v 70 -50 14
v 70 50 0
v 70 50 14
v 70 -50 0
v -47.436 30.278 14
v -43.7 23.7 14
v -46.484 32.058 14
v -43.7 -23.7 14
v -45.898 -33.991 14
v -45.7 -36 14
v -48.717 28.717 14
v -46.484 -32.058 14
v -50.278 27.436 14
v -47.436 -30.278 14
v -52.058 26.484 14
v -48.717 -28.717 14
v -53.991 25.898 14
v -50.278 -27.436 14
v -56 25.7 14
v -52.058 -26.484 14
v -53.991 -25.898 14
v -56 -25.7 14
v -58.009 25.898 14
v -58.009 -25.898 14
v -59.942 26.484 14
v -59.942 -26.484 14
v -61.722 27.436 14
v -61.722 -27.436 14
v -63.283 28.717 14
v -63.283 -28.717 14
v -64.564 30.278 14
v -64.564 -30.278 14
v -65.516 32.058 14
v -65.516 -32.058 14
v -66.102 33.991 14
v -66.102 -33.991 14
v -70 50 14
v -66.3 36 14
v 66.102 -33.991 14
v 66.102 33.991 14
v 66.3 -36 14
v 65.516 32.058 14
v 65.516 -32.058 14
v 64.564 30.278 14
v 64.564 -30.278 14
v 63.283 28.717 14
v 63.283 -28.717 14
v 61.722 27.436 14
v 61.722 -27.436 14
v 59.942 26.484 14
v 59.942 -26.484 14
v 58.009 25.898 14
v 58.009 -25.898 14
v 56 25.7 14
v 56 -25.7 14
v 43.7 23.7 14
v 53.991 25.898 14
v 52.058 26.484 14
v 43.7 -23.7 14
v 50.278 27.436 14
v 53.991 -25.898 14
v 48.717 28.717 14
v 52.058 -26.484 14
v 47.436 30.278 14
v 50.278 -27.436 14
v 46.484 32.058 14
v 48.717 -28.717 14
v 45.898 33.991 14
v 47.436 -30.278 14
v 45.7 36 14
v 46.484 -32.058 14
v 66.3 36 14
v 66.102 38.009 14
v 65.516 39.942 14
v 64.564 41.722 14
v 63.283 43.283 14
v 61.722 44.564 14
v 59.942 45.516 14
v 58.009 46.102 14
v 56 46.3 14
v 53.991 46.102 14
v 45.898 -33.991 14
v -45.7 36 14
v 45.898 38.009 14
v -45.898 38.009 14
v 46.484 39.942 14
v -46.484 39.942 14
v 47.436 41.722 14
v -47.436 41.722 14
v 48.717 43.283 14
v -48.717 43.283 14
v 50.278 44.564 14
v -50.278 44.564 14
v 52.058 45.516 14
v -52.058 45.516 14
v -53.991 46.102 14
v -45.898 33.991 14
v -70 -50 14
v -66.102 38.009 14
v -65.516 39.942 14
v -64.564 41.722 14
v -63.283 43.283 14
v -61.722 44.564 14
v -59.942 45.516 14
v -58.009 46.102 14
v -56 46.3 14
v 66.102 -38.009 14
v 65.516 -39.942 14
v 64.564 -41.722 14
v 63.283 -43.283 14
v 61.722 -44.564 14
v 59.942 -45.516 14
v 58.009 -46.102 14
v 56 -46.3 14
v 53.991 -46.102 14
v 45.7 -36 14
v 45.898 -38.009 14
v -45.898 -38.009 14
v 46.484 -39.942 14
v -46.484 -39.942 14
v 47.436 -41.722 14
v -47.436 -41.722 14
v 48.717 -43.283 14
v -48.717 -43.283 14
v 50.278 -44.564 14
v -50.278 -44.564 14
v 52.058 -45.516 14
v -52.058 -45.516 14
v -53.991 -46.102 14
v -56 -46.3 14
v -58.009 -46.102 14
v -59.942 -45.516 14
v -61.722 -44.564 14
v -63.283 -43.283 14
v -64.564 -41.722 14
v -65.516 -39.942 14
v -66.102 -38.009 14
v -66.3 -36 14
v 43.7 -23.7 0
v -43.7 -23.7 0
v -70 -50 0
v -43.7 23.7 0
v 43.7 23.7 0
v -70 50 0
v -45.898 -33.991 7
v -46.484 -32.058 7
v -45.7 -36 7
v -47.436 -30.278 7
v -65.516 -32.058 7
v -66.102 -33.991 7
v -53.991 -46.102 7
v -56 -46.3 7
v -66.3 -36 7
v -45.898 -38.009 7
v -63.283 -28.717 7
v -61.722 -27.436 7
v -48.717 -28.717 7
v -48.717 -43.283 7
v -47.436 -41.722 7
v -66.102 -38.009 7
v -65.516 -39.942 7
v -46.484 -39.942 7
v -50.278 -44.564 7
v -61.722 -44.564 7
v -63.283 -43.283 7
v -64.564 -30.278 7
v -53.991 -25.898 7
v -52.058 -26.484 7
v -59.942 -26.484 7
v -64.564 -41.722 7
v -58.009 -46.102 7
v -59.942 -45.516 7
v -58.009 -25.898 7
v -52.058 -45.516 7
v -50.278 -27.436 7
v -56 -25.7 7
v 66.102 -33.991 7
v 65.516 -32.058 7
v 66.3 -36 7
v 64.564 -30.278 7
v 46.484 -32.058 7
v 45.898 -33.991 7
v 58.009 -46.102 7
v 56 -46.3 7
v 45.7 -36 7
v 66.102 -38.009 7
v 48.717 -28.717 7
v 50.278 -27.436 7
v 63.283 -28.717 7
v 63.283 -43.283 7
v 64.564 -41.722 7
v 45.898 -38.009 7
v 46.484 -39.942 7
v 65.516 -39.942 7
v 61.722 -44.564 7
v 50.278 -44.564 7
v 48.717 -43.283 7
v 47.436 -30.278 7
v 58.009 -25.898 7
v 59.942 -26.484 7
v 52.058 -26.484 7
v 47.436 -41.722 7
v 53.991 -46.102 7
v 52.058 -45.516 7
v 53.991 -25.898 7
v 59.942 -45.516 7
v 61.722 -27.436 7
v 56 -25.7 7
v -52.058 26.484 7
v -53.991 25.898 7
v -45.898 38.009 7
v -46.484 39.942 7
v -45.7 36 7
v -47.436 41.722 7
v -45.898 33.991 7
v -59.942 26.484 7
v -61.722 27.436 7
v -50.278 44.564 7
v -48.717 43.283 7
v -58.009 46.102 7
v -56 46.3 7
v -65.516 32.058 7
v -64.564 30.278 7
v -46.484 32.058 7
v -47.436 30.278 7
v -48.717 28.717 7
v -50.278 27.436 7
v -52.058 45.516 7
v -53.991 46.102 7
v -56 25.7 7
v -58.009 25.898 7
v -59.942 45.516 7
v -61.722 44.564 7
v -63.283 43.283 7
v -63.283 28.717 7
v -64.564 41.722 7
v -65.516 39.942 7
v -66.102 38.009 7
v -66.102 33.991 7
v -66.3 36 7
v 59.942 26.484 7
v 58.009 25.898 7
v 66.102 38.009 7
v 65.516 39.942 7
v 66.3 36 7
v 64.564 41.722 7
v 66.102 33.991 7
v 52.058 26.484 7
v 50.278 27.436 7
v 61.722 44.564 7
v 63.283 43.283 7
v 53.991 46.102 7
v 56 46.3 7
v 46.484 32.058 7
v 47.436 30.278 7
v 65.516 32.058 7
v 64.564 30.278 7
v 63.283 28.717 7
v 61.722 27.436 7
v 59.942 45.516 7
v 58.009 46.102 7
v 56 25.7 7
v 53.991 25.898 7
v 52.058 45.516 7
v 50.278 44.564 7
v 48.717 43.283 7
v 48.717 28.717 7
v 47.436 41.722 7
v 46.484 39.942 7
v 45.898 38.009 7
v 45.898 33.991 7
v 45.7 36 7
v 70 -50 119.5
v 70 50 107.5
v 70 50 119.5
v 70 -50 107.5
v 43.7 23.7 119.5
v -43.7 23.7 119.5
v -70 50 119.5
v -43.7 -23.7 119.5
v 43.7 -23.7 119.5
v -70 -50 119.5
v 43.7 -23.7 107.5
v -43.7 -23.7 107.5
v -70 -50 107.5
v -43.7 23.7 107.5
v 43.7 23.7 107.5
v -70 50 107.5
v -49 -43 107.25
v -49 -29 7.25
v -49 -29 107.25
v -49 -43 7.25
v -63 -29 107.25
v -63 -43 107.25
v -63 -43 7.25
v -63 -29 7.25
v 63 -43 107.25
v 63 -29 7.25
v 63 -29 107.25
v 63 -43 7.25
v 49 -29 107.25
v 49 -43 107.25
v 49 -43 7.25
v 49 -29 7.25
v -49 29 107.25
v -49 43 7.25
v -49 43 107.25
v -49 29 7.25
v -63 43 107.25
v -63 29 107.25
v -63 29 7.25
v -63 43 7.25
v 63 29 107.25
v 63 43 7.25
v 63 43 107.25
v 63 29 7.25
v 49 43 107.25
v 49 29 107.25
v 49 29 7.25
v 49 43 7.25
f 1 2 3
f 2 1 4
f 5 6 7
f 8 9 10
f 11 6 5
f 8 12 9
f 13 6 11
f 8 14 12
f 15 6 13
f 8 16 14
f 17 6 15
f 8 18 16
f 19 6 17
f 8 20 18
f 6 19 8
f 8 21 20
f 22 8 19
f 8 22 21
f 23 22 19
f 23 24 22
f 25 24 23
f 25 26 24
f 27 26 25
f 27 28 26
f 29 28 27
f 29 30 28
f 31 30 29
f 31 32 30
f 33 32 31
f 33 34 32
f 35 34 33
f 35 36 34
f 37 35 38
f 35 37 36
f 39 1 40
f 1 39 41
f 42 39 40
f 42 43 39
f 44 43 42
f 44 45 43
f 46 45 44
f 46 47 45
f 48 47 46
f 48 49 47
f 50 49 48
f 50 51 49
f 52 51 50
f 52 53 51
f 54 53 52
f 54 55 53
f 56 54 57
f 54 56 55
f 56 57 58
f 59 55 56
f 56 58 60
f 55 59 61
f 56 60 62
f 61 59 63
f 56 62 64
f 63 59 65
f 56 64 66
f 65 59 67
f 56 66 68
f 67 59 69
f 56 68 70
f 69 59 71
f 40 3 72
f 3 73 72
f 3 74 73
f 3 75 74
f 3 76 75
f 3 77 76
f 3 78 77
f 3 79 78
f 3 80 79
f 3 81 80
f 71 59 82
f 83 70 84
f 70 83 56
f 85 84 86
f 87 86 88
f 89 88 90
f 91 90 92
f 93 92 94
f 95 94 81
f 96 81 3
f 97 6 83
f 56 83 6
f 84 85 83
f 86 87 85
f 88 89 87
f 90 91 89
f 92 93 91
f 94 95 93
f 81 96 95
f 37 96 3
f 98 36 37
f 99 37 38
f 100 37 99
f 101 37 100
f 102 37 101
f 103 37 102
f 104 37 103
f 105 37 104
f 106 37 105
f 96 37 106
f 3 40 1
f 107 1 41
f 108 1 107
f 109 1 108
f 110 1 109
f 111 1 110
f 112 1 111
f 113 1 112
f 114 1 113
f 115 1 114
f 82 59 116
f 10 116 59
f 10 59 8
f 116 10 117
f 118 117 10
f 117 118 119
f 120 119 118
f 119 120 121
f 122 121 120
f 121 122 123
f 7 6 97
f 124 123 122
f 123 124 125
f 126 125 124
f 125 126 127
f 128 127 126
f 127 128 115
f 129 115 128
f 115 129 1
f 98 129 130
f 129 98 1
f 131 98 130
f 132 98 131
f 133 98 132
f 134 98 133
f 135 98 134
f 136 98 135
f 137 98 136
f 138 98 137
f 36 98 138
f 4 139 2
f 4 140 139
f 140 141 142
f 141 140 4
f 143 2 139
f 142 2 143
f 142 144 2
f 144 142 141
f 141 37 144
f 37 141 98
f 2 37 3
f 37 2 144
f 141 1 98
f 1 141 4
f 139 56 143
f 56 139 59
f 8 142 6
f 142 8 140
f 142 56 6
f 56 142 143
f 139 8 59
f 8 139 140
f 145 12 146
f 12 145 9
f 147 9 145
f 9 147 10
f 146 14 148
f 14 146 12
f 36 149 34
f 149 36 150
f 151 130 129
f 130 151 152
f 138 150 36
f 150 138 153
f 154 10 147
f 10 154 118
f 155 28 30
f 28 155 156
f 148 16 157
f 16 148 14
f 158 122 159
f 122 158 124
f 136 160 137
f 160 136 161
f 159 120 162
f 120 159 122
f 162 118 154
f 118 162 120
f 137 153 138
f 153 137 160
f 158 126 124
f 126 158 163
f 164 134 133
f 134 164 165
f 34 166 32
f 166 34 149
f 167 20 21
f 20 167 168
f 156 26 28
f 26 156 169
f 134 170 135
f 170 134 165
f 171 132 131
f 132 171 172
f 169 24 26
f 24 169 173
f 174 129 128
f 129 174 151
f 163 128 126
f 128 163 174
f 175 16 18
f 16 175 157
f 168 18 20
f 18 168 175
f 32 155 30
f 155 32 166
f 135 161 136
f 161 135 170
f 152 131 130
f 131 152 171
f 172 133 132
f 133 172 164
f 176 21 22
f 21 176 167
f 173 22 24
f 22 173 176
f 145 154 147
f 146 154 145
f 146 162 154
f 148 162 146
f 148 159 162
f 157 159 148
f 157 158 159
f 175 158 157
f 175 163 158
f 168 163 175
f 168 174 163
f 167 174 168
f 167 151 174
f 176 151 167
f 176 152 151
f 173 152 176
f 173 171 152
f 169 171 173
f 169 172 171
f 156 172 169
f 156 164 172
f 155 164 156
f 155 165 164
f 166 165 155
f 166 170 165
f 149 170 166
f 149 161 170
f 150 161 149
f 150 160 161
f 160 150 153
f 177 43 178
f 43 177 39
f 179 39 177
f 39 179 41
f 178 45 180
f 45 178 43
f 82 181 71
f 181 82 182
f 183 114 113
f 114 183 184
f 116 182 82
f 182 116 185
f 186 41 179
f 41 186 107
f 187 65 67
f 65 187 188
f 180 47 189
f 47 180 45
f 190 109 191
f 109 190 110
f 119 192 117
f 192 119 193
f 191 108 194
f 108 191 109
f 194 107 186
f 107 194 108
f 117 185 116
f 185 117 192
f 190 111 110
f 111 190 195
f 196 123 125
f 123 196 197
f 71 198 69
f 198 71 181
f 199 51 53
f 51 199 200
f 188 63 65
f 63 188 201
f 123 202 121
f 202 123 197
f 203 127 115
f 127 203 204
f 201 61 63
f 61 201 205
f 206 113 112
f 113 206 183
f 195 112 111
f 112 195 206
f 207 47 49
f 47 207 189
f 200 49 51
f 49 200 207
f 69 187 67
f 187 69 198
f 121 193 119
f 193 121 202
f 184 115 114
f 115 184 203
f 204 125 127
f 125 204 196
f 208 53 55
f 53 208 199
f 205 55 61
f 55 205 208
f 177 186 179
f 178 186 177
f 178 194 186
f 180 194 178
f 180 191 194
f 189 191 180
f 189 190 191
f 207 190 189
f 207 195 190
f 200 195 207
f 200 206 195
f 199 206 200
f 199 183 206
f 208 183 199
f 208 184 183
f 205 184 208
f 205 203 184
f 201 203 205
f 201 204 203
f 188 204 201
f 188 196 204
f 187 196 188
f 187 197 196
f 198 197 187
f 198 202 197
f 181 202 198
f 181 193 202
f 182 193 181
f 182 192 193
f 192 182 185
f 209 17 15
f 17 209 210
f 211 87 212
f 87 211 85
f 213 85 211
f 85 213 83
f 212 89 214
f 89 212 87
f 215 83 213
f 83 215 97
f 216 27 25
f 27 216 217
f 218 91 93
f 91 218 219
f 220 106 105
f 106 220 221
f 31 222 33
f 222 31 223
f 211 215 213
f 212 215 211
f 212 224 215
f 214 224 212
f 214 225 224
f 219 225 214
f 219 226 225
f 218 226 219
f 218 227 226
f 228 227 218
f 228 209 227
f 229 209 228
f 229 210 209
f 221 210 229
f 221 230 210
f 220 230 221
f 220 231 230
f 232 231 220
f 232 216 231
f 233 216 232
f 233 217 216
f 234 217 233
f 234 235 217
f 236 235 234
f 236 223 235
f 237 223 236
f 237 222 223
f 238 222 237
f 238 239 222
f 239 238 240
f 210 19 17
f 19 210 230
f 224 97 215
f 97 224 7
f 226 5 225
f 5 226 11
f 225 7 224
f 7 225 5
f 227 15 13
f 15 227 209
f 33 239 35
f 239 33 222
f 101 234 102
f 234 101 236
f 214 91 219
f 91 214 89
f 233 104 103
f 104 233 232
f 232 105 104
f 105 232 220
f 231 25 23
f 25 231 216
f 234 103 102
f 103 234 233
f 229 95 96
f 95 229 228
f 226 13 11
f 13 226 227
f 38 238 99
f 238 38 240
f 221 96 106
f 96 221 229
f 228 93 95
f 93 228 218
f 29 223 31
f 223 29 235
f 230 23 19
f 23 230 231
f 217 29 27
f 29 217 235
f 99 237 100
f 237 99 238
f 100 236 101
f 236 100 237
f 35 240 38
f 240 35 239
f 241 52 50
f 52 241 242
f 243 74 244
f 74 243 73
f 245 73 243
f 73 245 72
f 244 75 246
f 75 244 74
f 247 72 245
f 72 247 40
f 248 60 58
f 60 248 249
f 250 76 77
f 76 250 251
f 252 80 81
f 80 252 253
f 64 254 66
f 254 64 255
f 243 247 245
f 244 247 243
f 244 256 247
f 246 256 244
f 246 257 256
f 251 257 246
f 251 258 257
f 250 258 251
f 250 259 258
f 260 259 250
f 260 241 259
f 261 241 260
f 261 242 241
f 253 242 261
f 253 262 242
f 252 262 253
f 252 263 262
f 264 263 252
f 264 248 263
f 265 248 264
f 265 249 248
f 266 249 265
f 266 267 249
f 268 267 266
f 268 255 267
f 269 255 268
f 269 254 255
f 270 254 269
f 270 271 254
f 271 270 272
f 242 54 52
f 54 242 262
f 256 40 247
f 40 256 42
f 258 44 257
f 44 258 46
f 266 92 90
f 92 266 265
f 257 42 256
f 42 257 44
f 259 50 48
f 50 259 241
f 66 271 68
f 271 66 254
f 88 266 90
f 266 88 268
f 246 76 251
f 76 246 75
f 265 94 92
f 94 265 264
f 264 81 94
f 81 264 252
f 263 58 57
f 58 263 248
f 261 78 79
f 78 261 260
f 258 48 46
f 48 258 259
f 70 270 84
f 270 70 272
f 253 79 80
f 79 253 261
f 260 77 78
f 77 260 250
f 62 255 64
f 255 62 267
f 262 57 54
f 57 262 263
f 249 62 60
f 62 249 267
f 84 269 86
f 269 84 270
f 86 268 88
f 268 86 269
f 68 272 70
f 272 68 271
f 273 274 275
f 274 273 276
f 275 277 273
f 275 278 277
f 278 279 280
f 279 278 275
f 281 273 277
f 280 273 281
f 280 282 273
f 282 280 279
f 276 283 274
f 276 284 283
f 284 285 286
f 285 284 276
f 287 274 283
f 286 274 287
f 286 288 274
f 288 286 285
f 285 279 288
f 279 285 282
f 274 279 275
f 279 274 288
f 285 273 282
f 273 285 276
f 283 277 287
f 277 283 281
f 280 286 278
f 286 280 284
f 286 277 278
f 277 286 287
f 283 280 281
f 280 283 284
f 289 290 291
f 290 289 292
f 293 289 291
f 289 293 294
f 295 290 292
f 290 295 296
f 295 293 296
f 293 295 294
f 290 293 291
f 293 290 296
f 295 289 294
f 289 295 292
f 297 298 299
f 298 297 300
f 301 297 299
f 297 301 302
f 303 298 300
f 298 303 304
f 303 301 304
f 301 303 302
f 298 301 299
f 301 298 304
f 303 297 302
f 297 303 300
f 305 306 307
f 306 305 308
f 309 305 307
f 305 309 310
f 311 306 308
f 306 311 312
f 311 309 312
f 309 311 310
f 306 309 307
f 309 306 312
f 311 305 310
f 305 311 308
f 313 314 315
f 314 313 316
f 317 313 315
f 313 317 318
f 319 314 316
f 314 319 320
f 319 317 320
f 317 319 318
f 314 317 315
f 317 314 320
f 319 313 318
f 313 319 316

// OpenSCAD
$fn = 32;

// ------------------------------------------------------------------------
// Frame cube: base 140 x 100 mm, posts 100 mm tall
// Every part is its own module, assembly() places every instance.
// ------------------------------------------------------------------------

// --- part 1 ---
module base_frame() {
  difference() {
    translate([-70, -50, 0]) cube([140, 100, 14]);
    translate([-43.7, -23.7, -1]) cube([87.4, 47.4, 16]);
    translate([-56, -36, 7]) cylinder(h = 8, d = 20.6);
    translate([56, -36, 7]) cylinder(h = 8, d = 20.6);
    translate([-56, 36, 7]) cylinder(h = 8, d = 20.6);
    translate([56, 36, 7]) cylinder(h = 8, d = 20.6);
  }
}

// --- part 2 ---
module corner_post() {
  translate([-7, -7, 0]) cube([14, 14, 100]);
}

// --- part 3 ---
module top_frame() {
  difference() {
    translate([-70, -50, 0]) cube([140, 100, 12]);
    translate([-43.7, -23.7, -1]) cube([87.4, 47.4, 14]);
  }
}

// --- assembly ---
module assembly() {
  color([0.80, 0.24, 0.20]) translate([0, 0, 0]) rotate([0, 0, 0]) base_frame();
  color([0.20, 0.45, 0.75]) translate([-56, -36, 7.25]) rotate([0, 0, 0]) corner_post();
  color([0.25, 0.62, 0.32]) translate([56, -36, 7.25]) rotate([0, 0, 0]) corner_post();
  color([0.92, 0.70, 0.18]) translate([-56, 36, 7.25]) rotate([0, 0, 0]) corner_post();
  color([0.58, 0.35, 0.70]) translate([56, 36, 7.25]) rotate([0, 0, 0]) corner_post();
  color([0.16, 0.66, 0.66]) translate([0, 0, 107.5]) rotate([0, 0, 0]) top_frame();
}

assembly();
